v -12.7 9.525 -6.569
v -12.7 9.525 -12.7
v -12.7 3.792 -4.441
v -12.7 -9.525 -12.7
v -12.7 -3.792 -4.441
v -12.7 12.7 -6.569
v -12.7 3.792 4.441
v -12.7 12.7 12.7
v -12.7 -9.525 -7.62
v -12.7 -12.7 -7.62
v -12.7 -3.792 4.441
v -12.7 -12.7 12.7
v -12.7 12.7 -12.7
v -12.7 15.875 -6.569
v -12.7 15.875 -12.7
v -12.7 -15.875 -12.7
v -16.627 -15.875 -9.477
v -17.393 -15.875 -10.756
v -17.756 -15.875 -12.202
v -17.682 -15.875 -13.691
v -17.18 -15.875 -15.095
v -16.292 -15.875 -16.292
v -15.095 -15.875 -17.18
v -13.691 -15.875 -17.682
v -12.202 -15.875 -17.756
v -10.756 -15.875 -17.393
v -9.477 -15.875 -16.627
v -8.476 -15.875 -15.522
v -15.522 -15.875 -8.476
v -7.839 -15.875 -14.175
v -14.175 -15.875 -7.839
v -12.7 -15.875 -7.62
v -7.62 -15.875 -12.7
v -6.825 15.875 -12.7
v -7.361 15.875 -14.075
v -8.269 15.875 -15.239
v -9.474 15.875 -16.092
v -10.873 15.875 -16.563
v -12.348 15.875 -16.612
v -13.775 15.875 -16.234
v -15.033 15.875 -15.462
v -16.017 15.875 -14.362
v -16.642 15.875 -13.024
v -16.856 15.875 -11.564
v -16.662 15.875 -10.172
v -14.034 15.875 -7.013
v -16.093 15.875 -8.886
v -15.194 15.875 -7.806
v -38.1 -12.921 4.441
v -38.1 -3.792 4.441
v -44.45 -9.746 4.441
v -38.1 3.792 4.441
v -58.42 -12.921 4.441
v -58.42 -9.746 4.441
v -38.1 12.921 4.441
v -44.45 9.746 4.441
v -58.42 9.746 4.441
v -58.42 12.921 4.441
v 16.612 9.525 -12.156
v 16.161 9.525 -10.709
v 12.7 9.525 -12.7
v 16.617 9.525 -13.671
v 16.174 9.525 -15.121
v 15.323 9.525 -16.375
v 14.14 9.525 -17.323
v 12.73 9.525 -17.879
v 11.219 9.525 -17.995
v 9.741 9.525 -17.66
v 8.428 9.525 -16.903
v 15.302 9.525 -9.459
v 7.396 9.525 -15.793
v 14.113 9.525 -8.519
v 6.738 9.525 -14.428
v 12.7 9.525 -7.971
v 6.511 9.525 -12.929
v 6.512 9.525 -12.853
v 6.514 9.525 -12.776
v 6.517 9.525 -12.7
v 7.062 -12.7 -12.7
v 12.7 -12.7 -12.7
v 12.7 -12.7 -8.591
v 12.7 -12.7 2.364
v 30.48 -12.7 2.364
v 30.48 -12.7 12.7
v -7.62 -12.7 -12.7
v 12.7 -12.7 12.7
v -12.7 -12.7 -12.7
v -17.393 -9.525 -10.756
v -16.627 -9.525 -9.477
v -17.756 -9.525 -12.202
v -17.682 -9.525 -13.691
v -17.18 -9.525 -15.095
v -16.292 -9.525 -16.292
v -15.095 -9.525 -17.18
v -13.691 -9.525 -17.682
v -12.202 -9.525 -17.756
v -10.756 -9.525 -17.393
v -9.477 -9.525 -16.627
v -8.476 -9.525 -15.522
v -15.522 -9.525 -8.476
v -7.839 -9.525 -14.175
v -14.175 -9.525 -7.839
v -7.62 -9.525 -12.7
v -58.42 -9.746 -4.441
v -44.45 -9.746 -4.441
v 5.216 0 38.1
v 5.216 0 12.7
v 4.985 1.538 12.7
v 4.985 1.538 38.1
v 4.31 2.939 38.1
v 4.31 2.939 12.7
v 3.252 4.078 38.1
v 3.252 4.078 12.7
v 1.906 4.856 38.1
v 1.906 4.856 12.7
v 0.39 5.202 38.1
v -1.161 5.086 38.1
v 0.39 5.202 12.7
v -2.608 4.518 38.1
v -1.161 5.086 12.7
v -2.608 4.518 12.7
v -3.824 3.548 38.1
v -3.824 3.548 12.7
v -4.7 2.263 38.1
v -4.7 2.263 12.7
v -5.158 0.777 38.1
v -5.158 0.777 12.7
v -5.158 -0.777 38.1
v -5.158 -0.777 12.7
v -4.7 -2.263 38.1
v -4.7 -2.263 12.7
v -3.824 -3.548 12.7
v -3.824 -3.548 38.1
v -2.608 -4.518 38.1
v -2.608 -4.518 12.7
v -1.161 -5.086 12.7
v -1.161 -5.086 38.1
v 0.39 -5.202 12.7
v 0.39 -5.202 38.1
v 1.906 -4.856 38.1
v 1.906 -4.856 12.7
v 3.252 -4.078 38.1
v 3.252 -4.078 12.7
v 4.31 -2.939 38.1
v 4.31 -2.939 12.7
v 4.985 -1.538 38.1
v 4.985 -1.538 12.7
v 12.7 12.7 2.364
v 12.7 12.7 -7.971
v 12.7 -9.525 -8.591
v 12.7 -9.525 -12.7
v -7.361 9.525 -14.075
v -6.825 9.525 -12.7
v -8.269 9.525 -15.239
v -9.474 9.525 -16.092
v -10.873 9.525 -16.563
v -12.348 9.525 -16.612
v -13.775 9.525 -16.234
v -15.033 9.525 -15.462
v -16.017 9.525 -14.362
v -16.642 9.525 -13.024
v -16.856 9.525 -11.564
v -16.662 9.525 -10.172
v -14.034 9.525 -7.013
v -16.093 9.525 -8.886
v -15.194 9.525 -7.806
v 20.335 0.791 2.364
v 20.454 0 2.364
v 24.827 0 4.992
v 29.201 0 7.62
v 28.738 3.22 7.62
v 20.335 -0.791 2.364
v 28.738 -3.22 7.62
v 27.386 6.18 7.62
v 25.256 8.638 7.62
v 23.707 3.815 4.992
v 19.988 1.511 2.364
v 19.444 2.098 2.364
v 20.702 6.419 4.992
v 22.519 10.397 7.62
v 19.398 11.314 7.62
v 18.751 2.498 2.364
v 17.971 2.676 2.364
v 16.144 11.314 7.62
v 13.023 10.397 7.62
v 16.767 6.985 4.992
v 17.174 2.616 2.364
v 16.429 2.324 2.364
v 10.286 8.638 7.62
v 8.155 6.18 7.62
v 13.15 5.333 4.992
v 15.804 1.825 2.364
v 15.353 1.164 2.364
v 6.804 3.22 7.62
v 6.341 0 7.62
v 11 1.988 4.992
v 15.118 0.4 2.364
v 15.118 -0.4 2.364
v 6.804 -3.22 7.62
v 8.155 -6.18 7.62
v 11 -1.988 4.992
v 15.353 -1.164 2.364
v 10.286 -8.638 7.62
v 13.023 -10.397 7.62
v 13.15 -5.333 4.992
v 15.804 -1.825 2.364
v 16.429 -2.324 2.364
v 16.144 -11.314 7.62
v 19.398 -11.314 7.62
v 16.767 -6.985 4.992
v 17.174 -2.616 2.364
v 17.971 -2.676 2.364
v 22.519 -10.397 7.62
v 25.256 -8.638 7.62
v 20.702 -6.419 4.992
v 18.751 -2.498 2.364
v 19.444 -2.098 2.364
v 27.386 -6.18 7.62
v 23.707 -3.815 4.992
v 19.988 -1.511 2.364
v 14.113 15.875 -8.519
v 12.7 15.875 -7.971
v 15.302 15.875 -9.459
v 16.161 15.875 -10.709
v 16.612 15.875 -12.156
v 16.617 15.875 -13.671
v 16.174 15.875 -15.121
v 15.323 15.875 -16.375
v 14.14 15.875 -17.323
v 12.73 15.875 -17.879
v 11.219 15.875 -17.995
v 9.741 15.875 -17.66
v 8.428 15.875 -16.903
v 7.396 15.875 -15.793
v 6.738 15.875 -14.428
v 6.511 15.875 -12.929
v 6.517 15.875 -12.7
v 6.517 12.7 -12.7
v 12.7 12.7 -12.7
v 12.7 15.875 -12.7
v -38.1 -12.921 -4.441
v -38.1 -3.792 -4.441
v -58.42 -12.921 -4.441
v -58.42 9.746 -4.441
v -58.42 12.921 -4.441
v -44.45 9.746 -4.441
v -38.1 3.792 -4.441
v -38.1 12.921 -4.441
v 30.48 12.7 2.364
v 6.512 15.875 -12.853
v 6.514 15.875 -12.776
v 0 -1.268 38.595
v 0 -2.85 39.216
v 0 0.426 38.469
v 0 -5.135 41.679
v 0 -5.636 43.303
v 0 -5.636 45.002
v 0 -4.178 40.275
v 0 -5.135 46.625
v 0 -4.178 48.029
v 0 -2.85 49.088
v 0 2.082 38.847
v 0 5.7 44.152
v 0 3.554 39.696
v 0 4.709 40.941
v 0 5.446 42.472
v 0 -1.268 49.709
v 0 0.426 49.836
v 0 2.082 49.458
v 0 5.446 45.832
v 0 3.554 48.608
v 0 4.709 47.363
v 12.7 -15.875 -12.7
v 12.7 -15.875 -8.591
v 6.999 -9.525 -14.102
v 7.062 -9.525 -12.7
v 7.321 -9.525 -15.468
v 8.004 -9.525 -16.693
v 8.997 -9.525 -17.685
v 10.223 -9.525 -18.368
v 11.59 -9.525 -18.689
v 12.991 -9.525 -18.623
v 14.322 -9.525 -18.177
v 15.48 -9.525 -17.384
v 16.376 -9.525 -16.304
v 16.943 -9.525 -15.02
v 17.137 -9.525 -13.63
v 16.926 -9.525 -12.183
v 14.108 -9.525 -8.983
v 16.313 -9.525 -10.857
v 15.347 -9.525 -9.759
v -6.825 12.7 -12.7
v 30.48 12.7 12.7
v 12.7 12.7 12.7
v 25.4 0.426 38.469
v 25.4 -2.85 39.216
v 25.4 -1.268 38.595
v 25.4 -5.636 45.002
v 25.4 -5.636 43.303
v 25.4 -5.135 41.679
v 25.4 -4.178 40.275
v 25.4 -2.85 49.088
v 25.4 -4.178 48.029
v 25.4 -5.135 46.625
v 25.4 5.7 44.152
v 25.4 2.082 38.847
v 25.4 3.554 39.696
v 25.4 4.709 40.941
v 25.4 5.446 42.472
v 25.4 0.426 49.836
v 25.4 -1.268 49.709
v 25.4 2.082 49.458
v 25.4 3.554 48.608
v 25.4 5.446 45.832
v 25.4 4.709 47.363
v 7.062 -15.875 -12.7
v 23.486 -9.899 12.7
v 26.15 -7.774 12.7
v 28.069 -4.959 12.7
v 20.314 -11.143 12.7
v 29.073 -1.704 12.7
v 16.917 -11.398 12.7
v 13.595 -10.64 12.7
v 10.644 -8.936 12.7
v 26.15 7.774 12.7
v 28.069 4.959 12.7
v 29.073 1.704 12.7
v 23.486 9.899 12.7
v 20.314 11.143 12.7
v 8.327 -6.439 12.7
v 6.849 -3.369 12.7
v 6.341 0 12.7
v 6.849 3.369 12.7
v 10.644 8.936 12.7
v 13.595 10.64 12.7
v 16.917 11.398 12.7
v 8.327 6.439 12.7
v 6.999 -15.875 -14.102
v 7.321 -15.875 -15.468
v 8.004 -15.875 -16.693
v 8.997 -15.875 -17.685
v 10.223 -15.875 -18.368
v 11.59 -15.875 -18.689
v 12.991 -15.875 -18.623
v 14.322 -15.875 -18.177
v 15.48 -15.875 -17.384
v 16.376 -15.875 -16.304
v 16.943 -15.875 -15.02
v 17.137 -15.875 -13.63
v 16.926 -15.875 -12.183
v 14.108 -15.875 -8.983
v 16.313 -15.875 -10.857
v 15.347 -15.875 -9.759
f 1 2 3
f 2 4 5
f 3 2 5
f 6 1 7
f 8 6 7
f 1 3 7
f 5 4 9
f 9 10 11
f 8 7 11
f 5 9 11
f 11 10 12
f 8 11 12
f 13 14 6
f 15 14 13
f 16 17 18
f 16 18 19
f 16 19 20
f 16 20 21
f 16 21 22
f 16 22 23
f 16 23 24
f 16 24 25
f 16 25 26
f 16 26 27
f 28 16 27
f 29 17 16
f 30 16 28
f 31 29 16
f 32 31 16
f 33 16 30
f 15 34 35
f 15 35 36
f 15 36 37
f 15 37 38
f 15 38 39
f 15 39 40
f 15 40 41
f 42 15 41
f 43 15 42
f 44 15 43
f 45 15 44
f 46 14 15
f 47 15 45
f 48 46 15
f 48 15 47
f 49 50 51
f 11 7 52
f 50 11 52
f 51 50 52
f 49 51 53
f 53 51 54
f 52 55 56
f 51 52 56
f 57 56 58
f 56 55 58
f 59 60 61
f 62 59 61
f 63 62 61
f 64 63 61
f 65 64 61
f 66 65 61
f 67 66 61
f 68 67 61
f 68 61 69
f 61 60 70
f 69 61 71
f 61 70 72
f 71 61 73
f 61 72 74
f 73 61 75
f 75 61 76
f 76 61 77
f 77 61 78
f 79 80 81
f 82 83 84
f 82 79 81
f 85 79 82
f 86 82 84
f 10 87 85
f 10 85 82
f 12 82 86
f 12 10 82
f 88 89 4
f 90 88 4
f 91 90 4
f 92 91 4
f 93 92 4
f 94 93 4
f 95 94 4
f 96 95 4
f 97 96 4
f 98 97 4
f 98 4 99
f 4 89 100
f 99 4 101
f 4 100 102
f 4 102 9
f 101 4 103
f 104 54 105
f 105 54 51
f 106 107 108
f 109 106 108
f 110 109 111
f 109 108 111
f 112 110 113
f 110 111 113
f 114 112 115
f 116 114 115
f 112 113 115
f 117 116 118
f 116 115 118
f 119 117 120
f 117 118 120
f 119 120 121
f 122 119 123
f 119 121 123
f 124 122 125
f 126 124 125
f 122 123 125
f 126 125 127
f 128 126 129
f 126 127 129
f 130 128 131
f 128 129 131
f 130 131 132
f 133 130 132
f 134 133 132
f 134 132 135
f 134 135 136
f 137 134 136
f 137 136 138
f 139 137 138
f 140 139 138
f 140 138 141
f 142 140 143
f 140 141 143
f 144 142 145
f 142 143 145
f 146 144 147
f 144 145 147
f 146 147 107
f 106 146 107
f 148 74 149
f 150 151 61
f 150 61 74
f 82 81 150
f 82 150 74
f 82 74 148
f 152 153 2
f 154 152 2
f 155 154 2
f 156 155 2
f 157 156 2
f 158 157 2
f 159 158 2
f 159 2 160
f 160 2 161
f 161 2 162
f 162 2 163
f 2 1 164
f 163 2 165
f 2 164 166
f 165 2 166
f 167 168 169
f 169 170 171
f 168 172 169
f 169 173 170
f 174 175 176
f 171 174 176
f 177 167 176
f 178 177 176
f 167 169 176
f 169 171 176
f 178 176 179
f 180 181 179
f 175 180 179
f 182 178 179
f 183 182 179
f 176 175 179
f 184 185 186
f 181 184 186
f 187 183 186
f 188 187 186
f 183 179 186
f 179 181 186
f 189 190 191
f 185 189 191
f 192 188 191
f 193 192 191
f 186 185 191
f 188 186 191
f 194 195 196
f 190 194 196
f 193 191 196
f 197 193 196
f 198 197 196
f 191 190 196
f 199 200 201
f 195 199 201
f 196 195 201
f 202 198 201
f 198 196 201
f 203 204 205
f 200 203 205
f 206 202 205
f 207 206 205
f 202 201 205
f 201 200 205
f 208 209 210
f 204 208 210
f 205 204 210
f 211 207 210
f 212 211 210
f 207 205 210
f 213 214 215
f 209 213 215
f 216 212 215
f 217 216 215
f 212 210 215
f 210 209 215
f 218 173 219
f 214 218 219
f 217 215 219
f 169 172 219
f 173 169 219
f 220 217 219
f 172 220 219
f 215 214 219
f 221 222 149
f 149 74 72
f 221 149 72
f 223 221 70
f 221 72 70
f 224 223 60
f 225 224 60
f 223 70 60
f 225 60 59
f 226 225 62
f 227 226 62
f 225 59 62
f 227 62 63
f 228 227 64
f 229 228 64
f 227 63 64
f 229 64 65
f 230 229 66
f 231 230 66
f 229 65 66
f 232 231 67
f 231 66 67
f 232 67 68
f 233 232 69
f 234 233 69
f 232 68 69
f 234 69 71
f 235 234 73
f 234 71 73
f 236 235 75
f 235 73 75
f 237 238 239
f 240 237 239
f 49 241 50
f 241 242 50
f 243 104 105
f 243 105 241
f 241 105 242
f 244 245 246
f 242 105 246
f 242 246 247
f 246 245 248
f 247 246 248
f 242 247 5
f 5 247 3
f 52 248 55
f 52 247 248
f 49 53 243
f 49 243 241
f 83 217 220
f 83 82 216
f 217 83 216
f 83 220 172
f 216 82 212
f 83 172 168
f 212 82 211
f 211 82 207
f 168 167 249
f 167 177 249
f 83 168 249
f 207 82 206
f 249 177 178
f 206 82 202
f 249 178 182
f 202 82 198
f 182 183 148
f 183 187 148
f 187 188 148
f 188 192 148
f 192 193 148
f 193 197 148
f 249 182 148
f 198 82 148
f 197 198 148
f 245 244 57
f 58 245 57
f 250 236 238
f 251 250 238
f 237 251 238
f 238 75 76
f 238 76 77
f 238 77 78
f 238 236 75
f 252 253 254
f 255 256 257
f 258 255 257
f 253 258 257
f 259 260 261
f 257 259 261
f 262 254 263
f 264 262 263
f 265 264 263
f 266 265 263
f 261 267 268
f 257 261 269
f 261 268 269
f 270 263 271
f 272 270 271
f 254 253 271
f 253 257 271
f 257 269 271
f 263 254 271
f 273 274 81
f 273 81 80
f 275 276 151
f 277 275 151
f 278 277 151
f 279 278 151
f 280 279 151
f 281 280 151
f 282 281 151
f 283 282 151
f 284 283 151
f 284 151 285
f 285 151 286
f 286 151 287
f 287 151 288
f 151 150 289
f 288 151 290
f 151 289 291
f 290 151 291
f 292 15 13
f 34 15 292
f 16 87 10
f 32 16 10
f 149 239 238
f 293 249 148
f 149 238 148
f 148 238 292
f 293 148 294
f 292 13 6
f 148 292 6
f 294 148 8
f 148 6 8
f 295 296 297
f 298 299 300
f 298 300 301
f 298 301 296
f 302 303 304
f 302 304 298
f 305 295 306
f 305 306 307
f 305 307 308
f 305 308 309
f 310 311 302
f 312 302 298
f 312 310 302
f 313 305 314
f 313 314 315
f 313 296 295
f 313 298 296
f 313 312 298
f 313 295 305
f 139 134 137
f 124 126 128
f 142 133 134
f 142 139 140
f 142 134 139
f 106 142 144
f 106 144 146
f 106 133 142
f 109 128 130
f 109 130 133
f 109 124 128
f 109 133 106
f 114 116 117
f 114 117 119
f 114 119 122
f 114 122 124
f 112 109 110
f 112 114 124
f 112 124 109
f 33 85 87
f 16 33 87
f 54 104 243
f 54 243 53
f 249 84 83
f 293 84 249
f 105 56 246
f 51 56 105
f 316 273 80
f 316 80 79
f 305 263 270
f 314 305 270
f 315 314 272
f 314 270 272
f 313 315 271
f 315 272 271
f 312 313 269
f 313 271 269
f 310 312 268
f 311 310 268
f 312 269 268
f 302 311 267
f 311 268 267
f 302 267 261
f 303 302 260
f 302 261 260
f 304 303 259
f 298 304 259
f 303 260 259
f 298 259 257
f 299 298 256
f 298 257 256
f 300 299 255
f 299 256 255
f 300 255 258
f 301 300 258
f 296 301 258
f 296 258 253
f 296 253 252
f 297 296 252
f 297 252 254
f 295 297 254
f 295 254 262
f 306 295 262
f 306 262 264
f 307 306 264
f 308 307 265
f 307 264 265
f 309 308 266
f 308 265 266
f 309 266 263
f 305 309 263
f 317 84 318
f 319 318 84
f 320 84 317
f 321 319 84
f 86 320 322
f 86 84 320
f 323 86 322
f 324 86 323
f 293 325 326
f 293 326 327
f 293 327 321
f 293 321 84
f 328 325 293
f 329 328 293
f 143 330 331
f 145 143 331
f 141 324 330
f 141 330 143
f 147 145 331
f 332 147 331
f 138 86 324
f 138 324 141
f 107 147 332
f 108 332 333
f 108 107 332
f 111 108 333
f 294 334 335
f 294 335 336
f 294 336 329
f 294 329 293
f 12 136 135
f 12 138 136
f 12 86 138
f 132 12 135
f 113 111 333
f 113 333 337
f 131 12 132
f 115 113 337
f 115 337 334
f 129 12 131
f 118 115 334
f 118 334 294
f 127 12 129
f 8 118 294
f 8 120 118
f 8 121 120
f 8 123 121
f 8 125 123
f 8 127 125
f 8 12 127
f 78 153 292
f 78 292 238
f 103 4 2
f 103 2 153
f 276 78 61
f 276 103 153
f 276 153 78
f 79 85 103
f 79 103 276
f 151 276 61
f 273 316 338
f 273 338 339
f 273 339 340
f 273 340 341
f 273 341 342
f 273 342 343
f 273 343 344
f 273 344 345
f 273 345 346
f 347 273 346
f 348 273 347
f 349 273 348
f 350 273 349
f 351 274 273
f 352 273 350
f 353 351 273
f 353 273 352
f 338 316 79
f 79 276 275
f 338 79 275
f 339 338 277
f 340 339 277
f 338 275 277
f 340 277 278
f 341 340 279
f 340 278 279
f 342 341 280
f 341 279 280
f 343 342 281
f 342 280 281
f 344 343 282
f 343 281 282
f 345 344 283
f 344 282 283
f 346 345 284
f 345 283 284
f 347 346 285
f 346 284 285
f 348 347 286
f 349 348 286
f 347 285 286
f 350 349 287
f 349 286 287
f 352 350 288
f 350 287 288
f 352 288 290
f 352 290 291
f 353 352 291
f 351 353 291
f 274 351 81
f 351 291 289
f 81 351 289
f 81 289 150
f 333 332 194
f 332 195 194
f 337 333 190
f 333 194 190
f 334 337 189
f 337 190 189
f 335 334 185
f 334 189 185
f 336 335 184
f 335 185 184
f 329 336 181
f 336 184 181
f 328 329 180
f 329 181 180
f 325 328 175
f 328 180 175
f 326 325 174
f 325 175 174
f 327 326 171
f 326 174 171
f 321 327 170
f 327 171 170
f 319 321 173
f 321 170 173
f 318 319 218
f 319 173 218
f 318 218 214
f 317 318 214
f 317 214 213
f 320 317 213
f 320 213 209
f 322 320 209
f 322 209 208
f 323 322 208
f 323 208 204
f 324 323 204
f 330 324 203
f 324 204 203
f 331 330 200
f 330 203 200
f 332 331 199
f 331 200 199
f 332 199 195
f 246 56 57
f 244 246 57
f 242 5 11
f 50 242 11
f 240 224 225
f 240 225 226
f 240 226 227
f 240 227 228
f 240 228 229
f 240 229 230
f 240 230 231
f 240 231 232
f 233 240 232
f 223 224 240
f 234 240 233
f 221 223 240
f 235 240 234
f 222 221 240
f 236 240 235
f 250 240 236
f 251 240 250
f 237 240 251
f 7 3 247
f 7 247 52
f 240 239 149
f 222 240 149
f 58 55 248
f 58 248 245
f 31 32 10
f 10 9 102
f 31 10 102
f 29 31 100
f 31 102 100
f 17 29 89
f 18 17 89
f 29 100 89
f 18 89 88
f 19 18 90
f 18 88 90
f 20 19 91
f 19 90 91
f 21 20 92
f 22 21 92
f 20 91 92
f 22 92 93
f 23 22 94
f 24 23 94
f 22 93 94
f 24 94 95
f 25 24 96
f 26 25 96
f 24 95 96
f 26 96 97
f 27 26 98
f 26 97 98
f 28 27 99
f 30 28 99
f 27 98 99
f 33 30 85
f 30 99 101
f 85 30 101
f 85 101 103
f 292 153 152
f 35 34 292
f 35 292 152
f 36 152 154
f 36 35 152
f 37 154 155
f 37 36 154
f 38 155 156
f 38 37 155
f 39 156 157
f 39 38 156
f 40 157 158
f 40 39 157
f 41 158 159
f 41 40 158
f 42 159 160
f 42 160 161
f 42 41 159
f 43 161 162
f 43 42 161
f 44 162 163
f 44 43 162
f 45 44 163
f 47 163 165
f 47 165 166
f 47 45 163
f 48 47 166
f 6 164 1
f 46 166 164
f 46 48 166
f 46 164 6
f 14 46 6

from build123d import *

# Parameters (mm, degrees)
F0_W      = 25.4
F0_H      = 25.4
F1_DEPTH  = 12.7
F3_DEPTH  = 3.175
F5_DEPTH  = 3.175
F6_R      = 5.2164072596
F7_DEPTH  = 25.4
F8_R      = 5.6995289673
F9_DEPTH  = 25.4
F12_W     = 7.5837243348
F12_H     = 8.8812420145
F13_DEPTH = 25.4
F14_W     = 5.954047665
F14_H     = 8.8812420145
F14_W_2   = 7.5837243348
F15_DEPTH = 6.35
F16_W     = 6.35
F16_H     = 8.8812420145
F16_W_2   = 13.97
F17_DEPTH = 3.175
F18_W     = 13.97
F18_H     = 8.8812420145
F18_W_2   = 6.35
F19_DEPTH = 3.175
F20_W     = 25.4
F20_H     = 10.3356431233
F21_DEPTH = 17.78
F23_D     = 22.86
F23_DEPTH = 5.08
F23_TIP   = 6.8678368755


# Not quite as in the source:
# - the program builds the solid bodies; features that only make, move or delete a surface that nothing else refers to are left out


with BuildPart() as f1:
    # F0 (on Front) → F1 (new body, symmetric)
    with BuildSketch(Plane.XZ):
        Rectangle(F0_W, F0_H)
    extrude(amount=F1_DEPTH, both=True)

    # F2 (on face) → F3 (join, symmetric)
    with BuildSketch(Plane.XZ.offset(12.7)):
        with BuildLine():
            ThreePointArc((-12.7, -7.62), (-16.2921024484, -16.2921024484), (-7.62, -12.7))
            Line((-7.62, -12.7), (-12.7, -12.7))
            Line((-12.7, -12.7), (-12.7, -7.62))
        make_face()
        with BuildLine():
            Line((12.7, -12.7), (7.0624674123, -12.7))
            ThreePointArc((7.0624674123, -12.7), (11.5896136049, -18.6885230146), (17.136607753, -13.6300334707))
            ThreePointArc((17.136607753, -13.6300334707), (15.8694041425, -10.2731027754), (12.7, -8.5909416461))
            Line((12.7, -8.5909416461), (12.7, -12.7))
        make_face()
    extrude(amount=F3_DEPTH, both=True)

    # F4 (on face) → F5 (join, symmetric)
    with BuildSketch(Plane(origin=(0, 12.7, 0), x_dir=(-1, 0, 0), z_dir=(0, 1, 0))):
        with BuildLine():
            ThreePointArc((-12.7, -7.9712862466), (-14.7674220428, -16.8935743083), (-6.5113730115, -12.9288407043))
            ThreePointArc((-6.5113730115, -12.9288407043), (-6.5126624138, -12.8143913027), (-6.5165299664, -12.7))
            Line((-6.5165299664, -12.7), (-12.7, -12.7))
            Line((-12.7, -12.7), (-12.7, -7.9712862466))
        make_face()
        with BuildLine():
            Line((12.7, -12.7), (6.8250320748, -12.7))
            ThreePointArc((6.8250320748, -12.7), (12.3480368398, -16.6116586986), (16.856369065, -11.5639269352))
            ThreePointArc((16.856369065, -11.5639269352), (15.6813943626, -8.314745896), (12.7, -6.568598528))
            Line((12.7, -6.568598528), (12.7, -12.7))
        make_face()
    extrude(amount=F5_DEPTH, both=True)

    # F6 (on face) → F7 (join)
    with BuildSketch(Plane.XY.offset(12.7)):
        Circle(F6_R)
    extrude(amount=F7_DEPTH)

    # F12 (on face) → F13 (join)
    with BuildSketch(Plane(origin=(-12.7, 0, 0), x_dir=(0, -1, 0), z_dir=(-1, 0, 0))):
        Rectangle(F12_W, F12_H)
    extrude(amount=F13_DEPTH)

    # F14 (on face) → F15 (join)
    with BuildSketch(Plane(origin=(-38.1, 0, 0), x_dir=(0, -1, 0), z_dir=(-1, 0, 0))):
        with Locations((-6.7688859999, 0)):
            Rectangle(F14_W, F14_H)
        Rectangle(F14_W_2, F14_H)
        with Locations((6.7688859999, 0)):
            Rectangle(F14_W, F14_H)
    extrude(amount=F15_DEPTH)

    # F16 (on face) → F17 (join)
    with BuildSketch(Plane(origin=(0, 9.7459098324, 0), x_dir=(-1, 0, 0), z_dir=(0, 1, 0))):
        with Locations((41.275, 0)):
            Rectangle(F16_W, F16_H)
        with Locations((51.435, 0)):
            Rectangle(F16_W_2, F16_H)
    extrude(amount=F17_DEPTH)

    # F18 (on face) → F19 (join)
    with BuildSketch(Plane.XZ.offset(9.7459098324)):
        with Locations((-51.435, 0)):
            Rectangle(F18_W, F18_H)
        with Locations((-41.275, 0)):
            Rectangle(F18_W_2, F18_H)
    extrude(amount=F19_DEPTH)

    # F20 (on face) → F21 (join)
    with BuildSketch(Plane.YZ.offset(12.7)):
        with Locations((0, 7.5321784383)):
            Rectangle(F20_W, F20_H)
    extrude(amount=F21_DEPTH)

    # F23
    with Locations(Plane.XY.offset(12.7)):
        with Locations((17.7709162235, 0)):
            Hole(F23_D / 2, depth=F23_DEPTH)
            with Locations((0, 0, -(F23_DEPTH + F23_TIP / 2))):  # 118° drill point
                Cone(0, F23_D / 2, F23_TIP, mode=Mode.SUBTRACT)


with BuildPart() as f9:
    # F8 (on Right) → F9 (new body)
    with BuildSketch(Plane.YZ):
        with Locations((0, 44.1520959139)):
            Circle(F8_R)
    extrude(amount=F9_DEPTH)


solid = Compound([f1.part, f9.part])
